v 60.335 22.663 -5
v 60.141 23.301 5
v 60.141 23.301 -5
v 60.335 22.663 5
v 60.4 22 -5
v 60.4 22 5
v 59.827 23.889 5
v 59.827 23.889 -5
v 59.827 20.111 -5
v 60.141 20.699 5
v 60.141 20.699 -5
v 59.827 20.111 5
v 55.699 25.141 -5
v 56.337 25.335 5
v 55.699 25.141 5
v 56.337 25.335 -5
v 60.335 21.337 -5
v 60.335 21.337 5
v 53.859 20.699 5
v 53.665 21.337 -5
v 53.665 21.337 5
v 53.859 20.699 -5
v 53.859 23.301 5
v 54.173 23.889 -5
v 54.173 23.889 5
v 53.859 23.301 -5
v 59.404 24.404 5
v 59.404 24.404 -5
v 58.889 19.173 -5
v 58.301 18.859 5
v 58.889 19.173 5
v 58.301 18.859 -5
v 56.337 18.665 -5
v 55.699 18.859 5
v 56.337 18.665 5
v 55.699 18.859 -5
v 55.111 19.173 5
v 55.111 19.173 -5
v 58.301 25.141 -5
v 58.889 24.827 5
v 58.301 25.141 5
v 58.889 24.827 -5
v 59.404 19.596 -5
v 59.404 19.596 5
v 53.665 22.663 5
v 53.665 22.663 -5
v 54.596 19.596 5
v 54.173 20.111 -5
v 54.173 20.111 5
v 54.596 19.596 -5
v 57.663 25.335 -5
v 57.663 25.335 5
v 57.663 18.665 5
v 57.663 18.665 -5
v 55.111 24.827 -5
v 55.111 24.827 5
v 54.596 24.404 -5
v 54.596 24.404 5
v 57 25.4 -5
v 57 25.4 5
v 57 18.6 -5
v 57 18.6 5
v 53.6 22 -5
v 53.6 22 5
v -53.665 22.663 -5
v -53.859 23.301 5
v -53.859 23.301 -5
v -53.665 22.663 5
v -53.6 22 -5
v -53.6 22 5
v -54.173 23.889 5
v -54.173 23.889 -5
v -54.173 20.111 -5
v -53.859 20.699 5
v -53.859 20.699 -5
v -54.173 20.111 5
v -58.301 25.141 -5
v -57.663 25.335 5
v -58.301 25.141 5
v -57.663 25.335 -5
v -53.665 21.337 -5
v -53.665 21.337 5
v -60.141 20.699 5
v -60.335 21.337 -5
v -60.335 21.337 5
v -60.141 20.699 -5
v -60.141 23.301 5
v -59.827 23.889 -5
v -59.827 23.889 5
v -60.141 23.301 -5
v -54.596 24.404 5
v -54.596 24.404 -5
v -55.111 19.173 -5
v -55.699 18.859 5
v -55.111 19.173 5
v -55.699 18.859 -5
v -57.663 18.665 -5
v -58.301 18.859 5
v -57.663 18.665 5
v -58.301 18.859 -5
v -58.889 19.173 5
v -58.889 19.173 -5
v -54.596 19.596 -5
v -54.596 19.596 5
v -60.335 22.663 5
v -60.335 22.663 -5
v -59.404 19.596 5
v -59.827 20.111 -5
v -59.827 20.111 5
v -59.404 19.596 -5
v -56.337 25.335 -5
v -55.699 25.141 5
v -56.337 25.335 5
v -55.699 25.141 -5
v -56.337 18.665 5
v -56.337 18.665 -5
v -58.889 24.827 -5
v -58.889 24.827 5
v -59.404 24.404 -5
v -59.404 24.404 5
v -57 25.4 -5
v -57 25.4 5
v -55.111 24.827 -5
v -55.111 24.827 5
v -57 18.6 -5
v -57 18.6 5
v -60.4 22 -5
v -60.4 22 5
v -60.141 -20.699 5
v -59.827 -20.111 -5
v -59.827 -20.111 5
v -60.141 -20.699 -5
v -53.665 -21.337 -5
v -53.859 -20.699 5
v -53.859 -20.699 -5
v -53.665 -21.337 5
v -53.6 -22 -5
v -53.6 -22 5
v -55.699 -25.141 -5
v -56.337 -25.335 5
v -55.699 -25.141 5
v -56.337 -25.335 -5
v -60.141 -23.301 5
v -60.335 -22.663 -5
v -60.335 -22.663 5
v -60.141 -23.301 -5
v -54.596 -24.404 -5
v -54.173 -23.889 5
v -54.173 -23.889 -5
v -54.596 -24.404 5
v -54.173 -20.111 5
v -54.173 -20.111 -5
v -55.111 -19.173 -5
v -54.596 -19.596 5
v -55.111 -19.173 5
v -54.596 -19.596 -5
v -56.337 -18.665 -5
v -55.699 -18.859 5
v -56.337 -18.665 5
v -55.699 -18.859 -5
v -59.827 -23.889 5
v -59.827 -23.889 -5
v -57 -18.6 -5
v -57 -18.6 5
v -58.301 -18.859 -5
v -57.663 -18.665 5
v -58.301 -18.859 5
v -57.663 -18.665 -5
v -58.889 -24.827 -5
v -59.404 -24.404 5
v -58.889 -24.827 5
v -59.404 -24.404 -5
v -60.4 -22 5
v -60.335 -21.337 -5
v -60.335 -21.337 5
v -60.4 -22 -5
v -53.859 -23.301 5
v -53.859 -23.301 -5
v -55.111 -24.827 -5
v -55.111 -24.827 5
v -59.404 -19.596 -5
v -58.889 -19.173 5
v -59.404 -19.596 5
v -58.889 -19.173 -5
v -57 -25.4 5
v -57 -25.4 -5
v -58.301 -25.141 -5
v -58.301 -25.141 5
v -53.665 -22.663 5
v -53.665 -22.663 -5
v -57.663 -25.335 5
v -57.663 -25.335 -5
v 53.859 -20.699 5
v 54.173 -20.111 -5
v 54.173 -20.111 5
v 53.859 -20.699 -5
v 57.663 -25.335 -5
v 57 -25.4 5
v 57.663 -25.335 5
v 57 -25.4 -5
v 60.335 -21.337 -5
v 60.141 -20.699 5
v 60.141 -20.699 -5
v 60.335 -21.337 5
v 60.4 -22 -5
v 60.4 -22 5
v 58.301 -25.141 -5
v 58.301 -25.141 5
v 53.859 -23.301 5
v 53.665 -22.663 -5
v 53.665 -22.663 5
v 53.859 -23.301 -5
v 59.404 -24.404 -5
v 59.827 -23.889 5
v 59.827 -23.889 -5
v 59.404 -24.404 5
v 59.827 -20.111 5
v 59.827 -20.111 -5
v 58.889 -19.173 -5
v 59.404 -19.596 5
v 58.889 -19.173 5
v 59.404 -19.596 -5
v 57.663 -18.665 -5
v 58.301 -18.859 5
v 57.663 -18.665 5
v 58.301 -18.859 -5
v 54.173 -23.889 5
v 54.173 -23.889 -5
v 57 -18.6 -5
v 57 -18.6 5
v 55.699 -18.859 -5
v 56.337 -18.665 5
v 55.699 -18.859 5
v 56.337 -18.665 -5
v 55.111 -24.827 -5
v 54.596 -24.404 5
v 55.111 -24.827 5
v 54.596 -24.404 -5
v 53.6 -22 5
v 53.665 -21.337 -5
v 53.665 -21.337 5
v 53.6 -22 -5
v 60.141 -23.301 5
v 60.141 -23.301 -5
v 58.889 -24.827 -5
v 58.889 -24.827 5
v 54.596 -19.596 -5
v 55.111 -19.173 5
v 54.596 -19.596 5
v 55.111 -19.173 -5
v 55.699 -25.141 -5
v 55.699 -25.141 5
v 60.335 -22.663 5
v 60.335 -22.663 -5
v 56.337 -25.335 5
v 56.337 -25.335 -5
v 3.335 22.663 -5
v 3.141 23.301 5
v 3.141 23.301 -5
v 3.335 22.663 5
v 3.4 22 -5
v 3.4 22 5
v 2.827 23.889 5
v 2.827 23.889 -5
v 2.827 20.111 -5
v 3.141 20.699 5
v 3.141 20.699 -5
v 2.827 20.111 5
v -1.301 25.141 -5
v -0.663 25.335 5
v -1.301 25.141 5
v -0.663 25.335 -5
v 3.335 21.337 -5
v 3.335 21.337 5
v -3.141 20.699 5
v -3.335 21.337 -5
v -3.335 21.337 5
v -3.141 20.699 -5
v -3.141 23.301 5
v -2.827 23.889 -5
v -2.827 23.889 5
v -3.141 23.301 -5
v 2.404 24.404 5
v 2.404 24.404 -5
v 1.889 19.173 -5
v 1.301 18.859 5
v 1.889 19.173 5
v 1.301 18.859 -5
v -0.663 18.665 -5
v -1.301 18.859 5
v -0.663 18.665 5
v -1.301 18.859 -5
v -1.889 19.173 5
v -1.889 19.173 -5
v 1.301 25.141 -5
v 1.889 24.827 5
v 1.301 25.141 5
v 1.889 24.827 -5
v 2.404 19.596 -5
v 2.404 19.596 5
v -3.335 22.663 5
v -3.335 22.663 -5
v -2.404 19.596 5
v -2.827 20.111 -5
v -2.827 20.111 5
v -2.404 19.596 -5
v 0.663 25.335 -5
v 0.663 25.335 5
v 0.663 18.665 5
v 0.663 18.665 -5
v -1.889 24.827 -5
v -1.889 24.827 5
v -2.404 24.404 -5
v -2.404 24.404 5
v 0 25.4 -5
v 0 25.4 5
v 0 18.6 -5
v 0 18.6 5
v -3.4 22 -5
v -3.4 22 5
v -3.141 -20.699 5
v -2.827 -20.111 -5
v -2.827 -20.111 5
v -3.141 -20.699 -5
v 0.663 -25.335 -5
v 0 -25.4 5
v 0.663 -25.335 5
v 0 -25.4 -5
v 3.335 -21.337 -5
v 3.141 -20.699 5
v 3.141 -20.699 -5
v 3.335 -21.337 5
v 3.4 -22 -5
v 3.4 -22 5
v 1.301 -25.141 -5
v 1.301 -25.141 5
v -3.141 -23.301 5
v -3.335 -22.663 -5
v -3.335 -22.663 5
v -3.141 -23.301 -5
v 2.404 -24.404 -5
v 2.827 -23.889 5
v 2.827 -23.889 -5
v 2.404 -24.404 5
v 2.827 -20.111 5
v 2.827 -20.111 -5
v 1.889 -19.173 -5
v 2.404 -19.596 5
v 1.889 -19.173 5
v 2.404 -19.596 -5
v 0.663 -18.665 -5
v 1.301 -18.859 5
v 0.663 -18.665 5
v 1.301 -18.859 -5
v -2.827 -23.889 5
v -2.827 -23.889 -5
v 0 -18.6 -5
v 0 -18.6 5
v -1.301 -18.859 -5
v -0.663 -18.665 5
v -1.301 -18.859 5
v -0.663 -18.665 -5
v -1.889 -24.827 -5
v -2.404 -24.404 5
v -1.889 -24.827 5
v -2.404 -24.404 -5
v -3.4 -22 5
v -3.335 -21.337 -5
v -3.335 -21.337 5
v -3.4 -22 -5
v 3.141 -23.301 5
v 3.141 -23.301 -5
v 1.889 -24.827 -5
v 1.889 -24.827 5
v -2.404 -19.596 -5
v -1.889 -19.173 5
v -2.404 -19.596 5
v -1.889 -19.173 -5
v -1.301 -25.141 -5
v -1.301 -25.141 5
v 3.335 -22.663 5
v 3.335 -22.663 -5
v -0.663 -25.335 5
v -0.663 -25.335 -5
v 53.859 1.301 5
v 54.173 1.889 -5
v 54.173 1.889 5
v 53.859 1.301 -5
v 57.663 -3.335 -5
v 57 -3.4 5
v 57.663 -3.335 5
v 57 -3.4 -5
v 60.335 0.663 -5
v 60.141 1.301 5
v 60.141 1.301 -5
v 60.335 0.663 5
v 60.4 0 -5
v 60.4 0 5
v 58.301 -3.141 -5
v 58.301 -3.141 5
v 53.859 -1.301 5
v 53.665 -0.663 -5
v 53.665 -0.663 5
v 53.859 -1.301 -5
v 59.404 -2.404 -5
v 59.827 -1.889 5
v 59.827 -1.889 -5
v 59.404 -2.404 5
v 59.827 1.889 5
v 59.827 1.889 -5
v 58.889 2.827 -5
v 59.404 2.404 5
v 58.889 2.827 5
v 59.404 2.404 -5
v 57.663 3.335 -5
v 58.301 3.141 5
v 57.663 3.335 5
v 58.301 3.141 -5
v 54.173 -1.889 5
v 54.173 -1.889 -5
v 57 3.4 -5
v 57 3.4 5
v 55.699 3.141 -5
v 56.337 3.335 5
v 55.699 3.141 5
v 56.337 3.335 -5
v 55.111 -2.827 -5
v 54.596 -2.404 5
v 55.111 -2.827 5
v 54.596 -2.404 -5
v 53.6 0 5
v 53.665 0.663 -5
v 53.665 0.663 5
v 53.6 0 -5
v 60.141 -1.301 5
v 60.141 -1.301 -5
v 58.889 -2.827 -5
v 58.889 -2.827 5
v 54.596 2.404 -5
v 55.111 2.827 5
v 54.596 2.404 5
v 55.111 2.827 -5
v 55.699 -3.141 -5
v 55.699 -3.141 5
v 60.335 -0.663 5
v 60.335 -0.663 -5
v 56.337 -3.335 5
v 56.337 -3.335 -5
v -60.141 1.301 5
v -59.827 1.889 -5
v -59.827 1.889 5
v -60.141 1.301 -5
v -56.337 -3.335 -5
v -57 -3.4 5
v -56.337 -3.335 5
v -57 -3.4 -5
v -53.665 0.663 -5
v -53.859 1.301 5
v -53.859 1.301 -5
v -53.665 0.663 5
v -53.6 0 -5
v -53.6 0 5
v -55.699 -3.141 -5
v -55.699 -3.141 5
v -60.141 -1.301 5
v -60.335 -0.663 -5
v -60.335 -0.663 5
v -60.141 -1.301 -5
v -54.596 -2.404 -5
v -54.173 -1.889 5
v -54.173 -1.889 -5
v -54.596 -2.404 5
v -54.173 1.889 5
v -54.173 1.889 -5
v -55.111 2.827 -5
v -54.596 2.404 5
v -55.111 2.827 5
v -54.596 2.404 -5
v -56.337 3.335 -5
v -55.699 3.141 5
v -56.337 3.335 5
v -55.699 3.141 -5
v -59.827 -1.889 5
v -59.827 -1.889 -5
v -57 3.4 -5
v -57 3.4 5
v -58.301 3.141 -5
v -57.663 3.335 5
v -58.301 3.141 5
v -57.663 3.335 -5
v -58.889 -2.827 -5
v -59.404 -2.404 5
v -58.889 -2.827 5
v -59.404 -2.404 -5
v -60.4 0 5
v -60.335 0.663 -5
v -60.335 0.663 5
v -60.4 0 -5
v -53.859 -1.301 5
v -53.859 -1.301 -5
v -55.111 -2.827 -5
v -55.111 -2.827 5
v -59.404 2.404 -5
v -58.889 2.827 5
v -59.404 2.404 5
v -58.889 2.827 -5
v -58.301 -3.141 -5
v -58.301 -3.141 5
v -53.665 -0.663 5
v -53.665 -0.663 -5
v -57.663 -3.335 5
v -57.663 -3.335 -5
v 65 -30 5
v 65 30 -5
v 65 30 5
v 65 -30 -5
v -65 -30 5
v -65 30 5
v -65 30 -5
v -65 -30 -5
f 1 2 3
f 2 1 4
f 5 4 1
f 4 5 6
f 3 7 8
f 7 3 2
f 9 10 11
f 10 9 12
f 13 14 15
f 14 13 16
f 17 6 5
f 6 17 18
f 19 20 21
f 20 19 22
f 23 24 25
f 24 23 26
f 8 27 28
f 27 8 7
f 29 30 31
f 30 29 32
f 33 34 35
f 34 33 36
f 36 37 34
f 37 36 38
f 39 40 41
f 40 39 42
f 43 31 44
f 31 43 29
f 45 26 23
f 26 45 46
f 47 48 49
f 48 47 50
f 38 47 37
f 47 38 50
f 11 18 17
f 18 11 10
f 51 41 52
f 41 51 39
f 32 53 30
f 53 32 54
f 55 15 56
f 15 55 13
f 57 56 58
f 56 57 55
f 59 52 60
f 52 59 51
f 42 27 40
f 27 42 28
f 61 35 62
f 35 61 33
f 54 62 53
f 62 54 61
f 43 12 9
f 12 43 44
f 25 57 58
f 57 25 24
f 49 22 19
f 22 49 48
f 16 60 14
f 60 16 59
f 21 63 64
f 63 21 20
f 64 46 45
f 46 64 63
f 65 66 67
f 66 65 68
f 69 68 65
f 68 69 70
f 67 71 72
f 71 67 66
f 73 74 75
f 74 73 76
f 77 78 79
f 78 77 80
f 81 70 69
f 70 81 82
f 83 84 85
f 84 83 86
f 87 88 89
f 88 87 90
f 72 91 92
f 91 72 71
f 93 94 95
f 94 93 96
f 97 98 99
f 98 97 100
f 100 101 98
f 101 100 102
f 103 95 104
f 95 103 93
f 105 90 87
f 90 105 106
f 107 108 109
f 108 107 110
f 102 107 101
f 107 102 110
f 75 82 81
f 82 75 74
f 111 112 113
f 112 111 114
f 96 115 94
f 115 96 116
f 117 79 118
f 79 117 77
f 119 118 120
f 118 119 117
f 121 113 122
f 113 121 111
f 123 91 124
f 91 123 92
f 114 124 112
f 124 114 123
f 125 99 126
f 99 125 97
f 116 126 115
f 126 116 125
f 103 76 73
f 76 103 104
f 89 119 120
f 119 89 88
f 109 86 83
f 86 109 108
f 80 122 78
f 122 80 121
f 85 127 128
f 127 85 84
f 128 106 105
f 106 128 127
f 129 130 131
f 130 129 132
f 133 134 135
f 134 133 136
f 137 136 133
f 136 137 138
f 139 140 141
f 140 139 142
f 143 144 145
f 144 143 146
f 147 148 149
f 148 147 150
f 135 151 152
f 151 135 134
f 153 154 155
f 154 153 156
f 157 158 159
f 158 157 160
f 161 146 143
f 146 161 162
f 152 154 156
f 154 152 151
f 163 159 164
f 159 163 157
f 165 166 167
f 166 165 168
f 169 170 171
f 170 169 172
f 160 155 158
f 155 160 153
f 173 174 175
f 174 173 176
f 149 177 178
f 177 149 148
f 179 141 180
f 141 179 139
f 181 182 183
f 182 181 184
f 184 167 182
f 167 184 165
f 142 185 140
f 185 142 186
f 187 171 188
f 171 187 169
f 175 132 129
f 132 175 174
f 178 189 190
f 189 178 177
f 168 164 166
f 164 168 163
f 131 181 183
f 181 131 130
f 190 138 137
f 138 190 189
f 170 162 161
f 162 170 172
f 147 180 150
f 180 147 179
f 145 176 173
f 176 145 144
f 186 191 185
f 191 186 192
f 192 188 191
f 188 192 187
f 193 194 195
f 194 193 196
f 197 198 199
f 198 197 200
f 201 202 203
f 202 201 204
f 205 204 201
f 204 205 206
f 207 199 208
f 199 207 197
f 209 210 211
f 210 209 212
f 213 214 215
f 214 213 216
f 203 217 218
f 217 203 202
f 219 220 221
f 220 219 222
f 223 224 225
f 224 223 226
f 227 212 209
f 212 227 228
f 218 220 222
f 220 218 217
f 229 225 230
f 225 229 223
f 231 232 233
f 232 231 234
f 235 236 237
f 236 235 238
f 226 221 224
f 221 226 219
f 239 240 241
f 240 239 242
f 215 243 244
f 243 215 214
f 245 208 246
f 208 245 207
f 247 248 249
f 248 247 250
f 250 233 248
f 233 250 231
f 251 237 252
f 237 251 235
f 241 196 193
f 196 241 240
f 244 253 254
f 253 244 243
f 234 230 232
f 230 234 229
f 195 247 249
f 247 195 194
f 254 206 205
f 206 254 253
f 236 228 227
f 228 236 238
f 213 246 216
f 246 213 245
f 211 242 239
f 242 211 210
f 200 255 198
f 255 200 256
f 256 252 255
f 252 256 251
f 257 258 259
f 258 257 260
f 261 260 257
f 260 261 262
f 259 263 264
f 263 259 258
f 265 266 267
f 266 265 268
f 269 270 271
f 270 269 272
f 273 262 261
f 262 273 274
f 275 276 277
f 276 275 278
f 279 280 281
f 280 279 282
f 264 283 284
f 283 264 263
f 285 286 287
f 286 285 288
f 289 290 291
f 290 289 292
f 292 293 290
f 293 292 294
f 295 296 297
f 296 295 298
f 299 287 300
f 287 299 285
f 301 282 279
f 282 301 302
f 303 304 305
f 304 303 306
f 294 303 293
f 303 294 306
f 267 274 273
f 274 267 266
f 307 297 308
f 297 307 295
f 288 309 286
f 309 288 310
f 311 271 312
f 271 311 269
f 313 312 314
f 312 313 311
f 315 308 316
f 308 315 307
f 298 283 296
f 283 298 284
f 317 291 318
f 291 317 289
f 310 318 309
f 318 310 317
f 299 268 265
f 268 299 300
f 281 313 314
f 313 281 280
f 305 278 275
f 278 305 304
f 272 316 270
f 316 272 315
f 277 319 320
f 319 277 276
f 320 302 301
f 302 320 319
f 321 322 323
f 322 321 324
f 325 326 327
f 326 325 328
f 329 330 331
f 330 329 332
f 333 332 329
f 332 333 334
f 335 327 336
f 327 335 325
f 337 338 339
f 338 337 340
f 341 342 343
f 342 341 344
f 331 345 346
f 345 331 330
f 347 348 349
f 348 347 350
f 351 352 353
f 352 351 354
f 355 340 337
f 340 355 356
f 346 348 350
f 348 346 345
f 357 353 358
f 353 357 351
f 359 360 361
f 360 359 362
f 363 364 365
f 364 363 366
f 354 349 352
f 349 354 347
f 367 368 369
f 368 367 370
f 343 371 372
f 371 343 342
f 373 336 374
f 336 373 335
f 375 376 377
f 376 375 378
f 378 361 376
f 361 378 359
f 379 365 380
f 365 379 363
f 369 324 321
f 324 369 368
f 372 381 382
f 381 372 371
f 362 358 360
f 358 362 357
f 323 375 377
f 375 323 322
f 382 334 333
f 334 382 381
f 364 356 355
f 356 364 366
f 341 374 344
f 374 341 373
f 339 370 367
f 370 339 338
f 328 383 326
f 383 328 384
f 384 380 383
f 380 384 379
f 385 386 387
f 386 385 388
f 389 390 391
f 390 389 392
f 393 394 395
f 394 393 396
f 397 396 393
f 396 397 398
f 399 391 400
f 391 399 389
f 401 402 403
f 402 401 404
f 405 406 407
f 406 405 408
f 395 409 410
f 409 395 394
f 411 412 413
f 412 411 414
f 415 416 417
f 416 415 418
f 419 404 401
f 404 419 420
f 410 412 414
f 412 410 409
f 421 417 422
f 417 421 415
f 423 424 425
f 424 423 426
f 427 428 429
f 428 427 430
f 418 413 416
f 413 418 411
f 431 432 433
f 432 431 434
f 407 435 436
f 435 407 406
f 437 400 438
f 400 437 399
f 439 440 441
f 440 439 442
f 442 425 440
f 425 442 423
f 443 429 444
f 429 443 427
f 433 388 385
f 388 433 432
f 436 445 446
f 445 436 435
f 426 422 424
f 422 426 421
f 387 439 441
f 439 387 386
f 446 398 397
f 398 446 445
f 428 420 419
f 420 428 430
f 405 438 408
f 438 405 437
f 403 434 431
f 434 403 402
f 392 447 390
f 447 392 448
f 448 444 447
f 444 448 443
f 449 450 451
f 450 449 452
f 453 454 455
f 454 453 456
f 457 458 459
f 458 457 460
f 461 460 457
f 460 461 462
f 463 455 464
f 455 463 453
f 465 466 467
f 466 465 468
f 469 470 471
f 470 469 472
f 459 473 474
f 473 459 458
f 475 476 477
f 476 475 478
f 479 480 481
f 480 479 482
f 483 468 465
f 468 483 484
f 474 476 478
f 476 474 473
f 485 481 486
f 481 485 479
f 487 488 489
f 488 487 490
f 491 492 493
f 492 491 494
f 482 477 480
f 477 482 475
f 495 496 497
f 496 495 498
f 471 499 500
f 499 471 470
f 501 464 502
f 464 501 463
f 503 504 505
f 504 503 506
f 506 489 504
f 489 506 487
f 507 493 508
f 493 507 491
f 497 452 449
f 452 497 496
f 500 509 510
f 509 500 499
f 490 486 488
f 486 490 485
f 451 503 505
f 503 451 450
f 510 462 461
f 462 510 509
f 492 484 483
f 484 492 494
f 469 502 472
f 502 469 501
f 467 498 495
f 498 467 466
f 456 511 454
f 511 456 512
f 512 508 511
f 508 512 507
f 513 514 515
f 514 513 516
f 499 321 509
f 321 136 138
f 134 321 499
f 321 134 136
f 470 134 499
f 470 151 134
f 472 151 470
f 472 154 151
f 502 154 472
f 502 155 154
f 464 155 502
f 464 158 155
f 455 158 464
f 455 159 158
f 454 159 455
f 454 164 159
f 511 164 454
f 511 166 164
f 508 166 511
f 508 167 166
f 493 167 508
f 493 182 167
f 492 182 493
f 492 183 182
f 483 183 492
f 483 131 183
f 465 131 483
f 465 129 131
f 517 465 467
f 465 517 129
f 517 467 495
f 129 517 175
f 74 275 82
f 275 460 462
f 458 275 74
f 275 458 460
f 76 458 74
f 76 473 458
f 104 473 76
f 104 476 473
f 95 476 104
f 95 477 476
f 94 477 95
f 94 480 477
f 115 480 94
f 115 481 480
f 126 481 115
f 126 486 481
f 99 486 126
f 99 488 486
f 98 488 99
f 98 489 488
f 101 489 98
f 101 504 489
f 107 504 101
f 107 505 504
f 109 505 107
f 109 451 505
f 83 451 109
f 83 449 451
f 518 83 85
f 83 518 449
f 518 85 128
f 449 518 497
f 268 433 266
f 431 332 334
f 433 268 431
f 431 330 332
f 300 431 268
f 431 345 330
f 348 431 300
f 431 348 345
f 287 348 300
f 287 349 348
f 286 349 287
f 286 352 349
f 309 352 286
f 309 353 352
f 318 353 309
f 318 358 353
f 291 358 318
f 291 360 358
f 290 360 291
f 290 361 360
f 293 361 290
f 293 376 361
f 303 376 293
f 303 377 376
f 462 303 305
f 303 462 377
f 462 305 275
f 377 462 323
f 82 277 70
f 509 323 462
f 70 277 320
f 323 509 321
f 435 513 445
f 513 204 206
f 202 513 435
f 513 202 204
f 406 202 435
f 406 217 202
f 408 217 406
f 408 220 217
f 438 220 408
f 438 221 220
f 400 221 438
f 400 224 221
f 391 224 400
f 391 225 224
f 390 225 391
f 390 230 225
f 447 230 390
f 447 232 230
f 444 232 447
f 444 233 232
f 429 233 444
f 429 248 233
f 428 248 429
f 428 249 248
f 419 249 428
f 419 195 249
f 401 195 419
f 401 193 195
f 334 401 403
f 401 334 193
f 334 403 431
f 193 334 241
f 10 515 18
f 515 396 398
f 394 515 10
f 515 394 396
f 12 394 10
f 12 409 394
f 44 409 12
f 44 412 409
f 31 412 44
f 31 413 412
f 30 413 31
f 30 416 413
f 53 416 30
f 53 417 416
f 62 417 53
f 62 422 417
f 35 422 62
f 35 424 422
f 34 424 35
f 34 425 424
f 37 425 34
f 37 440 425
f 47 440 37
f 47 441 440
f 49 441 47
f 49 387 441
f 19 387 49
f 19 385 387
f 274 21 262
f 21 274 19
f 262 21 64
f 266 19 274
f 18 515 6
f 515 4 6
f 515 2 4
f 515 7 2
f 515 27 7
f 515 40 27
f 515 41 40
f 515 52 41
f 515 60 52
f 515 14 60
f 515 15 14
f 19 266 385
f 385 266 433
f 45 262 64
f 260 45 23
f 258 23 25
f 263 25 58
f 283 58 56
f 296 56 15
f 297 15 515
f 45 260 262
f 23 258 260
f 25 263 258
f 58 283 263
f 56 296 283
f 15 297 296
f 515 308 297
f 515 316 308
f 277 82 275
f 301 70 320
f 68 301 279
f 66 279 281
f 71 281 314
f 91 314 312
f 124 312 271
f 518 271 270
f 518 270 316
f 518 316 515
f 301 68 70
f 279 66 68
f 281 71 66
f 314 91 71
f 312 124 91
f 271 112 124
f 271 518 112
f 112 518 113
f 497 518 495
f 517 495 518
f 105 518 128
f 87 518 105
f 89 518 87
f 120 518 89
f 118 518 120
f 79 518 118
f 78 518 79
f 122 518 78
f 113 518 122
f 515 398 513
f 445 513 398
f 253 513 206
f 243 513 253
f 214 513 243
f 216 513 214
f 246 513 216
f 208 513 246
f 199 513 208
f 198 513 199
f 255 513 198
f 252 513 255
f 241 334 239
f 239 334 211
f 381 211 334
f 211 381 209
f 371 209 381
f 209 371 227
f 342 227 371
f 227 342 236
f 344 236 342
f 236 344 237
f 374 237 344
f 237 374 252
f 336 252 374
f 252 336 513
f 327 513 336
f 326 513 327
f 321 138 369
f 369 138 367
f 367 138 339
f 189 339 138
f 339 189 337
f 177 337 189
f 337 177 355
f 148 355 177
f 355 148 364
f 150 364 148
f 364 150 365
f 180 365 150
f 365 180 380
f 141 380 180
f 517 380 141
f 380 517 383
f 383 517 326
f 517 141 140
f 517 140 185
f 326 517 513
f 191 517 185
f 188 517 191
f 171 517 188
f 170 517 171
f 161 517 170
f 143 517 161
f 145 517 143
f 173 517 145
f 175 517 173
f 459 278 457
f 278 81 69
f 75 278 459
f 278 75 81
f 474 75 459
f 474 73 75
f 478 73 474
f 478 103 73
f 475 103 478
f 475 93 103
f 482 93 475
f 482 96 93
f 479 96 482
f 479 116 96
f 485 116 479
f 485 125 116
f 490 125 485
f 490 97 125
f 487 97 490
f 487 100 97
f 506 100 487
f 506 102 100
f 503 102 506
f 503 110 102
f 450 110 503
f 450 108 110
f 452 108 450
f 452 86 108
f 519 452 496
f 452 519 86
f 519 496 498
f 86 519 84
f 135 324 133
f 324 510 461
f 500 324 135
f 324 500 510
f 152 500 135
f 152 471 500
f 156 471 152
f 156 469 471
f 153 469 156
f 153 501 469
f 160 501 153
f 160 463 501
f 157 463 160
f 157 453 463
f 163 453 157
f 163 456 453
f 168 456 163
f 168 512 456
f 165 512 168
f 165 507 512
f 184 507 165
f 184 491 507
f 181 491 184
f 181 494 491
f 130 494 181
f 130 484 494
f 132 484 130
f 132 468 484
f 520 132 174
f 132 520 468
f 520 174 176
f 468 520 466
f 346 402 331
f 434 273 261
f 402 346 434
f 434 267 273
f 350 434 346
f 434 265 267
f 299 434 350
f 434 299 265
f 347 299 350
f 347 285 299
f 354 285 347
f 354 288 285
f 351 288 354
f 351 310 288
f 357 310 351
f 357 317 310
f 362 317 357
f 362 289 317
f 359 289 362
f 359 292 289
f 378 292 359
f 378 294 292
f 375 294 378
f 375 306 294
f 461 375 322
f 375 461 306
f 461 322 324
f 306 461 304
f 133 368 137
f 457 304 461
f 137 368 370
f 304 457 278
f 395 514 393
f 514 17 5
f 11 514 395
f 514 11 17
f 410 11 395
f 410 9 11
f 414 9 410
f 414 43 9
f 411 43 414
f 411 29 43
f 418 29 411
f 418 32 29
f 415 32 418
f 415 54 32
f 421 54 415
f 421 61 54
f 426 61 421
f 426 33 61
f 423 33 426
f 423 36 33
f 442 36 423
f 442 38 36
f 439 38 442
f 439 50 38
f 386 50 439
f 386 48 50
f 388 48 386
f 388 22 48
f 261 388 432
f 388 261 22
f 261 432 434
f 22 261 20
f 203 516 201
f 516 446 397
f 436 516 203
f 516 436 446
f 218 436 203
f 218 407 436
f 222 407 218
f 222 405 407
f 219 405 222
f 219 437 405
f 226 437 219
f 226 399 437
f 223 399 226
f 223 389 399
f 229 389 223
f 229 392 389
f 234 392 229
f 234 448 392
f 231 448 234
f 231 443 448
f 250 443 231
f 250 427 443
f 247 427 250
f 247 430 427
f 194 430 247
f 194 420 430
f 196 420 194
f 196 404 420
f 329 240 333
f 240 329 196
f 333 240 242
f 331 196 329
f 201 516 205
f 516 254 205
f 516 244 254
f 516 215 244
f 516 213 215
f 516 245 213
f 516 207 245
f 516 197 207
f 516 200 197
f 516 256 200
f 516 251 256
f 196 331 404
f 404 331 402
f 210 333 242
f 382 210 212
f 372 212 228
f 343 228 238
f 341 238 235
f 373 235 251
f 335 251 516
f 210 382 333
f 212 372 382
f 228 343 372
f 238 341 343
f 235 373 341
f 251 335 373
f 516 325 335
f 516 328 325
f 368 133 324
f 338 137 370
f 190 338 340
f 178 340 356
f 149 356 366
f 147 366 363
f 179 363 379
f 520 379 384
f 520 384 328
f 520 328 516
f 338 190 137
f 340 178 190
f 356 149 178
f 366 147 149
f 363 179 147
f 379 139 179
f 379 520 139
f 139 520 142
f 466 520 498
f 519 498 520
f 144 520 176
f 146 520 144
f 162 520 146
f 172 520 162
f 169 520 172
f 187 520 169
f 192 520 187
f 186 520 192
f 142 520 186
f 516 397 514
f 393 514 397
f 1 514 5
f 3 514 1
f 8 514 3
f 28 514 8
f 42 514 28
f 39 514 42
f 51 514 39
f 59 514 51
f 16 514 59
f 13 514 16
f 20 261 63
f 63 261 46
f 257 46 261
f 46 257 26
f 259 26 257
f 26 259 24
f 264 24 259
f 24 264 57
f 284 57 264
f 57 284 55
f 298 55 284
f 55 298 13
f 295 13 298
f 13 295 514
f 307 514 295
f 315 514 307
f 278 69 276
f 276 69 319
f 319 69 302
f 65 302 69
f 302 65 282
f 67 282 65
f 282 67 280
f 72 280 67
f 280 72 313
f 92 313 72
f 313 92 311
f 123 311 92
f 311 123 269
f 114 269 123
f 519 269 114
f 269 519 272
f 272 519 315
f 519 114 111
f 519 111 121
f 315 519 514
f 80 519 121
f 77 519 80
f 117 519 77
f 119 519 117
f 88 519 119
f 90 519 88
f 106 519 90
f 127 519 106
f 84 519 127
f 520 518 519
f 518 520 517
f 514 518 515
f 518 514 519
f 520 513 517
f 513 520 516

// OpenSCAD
$fn = 32;

// ----------------------------------------------------------------------
// Corner plate 130 x 60 x 10
// 8 holes, centres taken from the edge offset
// ----------------------------------------------------------------------

// --- parameters (mm) ---
plate = [130, 60, 10];  // overall size (x, y, z)
holes = 8;              // number of holes the drawing asks for
bore_d = 6.6;           // nominal hole diameter from the drawing
print_allowance = 0.2;  // clearance added for printing
edge = 8;               // hole centre offset from the plate edge

// --- derived feature positions (mm) ---
hole_d = bore_d + print_allowance;  // = 6.8   hole diameter as printed
corner_x = plate[0] / 2 - edge;     // = 57   corner hole X
corner_y = plate[1] / 2 - edge;     // = 22   corner hole Y
feature_centers = [
  [corner_x, corner_y],
  [-corner_x, corner_y],
  [-corner_x, -corner_y],
  [corner_x, -corner_y],
  [0, corner_y],
  [0, -corner_y],
  [corner_x, 0],
  [-corner_x, 0]
];   // hole centres the loop below drills

// plate outline, every hole drilled through with the same cutters
difference() {
  cube(plate, center = true);
  for (centre = feature_centers)
    translate([centre[0], centre[1], 0])
      cylinder(d = hole_d, h = plate[2] + 2, center = true);
}
